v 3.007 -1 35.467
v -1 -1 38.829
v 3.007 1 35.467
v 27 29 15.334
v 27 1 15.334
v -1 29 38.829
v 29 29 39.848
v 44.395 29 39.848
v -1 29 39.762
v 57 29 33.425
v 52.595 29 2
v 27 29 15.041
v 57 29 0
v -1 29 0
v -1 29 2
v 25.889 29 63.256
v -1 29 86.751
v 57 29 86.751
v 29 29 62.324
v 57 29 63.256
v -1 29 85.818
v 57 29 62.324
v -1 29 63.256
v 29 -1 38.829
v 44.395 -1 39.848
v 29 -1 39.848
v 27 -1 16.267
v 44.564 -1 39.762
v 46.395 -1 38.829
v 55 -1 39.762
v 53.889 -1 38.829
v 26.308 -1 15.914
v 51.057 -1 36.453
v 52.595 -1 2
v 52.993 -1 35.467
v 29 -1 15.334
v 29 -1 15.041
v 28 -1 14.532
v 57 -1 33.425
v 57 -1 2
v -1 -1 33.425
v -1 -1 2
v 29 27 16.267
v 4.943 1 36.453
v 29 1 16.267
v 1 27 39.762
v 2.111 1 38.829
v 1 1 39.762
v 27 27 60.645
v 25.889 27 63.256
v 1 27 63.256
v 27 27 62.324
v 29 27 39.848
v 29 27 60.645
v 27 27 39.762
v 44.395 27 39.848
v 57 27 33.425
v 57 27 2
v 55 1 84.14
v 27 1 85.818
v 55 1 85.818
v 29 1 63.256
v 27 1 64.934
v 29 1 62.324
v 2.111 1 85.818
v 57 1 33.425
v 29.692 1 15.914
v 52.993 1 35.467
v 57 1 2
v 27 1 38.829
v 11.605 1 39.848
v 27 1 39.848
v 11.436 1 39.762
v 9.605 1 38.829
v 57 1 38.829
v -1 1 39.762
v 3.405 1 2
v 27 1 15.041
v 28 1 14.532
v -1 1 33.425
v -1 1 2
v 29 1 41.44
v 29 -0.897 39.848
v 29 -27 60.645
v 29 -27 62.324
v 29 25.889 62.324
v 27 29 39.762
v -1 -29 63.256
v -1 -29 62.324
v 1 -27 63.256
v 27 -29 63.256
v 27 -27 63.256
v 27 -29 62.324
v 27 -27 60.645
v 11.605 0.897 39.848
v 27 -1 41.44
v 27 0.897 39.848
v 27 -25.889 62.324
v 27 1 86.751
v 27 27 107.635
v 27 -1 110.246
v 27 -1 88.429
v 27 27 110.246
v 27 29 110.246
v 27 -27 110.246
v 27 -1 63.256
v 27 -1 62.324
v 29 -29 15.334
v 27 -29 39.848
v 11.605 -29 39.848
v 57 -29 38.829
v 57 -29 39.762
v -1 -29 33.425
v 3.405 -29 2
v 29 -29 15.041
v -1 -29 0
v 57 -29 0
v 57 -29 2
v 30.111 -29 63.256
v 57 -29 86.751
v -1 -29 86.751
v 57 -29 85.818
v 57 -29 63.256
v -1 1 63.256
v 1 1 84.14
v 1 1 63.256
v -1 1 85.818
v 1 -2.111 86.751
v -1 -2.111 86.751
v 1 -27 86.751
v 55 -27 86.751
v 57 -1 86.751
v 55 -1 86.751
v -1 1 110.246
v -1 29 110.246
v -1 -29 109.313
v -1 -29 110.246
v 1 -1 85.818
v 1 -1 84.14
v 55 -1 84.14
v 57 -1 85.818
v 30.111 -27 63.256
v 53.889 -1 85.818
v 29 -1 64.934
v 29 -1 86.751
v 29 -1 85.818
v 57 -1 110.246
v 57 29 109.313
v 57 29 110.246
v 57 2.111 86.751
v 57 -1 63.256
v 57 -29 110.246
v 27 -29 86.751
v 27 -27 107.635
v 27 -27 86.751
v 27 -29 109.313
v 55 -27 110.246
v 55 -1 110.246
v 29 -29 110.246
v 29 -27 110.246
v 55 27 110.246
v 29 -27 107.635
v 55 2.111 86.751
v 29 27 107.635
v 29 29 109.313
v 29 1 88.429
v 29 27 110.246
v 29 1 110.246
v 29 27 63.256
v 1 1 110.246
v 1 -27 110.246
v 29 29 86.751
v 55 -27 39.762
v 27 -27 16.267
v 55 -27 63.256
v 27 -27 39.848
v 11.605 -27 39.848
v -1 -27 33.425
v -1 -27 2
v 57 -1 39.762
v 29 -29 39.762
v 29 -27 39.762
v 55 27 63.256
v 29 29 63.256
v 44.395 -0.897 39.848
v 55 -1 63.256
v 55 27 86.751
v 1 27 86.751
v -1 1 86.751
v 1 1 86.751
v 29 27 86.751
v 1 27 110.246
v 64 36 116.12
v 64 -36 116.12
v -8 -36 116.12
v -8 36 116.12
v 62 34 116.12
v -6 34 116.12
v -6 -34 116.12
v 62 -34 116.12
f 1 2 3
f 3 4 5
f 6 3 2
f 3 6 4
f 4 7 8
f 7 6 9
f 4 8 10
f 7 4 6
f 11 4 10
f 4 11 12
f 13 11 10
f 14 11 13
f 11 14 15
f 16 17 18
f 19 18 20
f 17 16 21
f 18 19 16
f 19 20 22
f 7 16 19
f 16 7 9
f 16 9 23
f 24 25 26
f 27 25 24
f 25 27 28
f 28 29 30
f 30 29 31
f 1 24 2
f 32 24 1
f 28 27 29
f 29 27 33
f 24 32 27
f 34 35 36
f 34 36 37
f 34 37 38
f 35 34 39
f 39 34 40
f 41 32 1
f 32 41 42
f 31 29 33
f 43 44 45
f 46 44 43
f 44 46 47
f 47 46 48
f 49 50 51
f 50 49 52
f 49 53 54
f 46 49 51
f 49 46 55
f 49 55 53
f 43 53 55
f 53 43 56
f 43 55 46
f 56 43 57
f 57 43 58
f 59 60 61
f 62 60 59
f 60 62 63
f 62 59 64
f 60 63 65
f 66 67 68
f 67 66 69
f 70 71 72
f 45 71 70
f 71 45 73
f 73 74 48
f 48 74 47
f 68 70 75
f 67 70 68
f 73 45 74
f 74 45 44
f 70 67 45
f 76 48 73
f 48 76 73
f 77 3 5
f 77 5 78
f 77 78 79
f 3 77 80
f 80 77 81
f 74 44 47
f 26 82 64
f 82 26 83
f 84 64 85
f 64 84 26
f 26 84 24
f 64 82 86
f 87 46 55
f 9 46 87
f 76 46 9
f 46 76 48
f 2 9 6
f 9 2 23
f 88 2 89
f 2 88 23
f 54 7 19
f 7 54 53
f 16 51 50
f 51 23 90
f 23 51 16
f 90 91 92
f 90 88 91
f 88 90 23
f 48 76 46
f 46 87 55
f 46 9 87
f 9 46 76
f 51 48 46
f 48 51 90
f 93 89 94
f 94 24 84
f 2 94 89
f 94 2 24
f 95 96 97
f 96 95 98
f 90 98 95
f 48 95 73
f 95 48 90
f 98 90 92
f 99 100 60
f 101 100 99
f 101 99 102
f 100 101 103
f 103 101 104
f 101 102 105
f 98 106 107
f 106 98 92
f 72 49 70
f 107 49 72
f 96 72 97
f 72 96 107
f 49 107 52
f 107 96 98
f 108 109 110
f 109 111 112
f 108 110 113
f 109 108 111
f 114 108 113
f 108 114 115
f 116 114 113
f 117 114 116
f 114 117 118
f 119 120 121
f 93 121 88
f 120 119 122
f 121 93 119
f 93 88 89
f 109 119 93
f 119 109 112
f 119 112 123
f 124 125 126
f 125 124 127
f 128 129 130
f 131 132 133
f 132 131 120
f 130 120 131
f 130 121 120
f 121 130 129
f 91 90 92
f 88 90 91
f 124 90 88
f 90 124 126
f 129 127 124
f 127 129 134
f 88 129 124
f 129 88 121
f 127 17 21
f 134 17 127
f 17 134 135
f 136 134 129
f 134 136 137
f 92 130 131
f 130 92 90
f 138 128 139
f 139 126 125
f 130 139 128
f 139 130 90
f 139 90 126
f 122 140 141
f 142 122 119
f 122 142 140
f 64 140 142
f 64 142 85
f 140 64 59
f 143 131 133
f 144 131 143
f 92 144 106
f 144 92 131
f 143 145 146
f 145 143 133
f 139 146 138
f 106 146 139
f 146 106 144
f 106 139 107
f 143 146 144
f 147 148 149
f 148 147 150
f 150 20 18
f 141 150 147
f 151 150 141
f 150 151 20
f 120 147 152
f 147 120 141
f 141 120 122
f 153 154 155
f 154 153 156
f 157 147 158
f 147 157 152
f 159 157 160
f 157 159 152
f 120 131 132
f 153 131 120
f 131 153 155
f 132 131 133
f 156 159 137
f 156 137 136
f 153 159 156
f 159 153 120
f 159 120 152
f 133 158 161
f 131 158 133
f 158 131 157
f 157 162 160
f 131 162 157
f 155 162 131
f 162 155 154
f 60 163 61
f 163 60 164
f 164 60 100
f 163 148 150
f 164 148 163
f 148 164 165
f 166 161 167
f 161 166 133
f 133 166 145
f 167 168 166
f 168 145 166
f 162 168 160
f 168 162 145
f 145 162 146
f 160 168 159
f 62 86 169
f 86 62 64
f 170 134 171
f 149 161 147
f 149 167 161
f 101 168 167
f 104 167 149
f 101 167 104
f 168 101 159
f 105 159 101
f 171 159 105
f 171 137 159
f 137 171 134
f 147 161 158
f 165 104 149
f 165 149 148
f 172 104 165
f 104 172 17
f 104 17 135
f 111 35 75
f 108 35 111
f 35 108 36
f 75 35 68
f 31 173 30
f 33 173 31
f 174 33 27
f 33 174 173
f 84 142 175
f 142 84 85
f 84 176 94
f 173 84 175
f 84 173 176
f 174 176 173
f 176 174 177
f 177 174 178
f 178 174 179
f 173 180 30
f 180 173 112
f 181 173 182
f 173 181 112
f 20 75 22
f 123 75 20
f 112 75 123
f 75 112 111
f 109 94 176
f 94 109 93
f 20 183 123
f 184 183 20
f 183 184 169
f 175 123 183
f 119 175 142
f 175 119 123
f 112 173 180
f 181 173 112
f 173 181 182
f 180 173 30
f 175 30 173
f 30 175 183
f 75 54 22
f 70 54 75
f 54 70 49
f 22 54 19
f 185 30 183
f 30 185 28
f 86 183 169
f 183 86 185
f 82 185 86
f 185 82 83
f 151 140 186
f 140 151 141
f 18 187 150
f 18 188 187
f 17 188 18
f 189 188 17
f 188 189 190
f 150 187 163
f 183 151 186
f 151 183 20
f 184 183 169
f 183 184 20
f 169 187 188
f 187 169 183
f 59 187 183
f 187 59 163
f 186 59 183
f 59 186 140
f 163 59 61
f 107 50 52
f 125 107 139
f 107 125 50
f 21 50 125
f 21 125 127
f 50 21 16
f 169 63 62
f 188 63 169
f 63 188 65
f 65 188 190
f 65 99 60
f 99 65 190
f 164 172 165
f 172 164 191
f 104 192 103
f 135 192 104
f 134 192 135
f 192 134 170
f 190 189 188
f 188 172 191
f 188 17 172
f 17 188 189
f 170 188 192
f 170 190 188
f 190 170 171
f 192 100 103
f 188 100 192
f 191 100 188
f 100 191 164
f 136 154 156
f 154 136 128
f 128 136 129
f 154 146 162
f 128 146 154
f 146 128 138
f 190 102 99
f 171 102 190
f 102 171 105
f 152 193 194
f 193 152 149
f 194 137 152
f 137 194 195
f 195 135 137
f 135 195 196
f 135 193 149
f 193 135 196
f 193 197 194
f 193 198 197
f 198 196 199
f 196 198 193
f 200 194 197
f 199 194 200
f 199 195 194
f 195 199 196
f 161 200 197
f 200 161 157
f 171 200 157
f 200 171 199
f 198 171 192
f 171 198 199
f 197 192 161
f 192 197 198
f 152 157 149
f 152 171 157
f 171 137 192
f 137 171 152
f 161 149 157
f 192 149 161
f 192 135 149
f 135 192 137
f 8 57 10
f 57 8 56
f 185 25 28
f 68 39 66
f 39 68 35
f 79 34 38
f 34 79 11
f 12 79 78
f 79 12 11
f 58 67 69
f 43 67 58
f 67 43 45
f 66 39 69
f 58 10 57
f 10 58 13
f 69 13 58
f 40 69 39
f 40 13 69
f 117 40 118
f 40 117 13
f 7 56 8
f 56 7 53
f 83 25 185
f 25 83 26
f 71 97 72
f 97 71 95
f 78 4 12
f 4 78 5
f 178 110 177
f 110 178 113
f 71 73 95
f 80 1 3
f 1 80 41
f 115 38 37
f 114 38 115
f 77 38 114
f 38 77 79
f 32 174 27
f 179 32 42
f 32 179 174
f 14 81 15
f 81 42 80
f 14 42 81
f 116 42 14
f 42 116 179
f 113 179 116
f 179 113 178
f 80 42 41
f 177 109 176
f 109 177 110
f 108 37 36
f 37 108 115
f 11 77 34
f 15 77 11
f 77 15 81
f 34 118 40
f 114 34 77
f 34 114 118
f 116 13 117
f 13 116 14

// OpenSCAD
// [FL_INDEX: keywords="openscad, 3d_parametric, Angular_Dice_Tower, csg_solid" | COT="Parametric OpenSCAD design from 3DCodeverse"]
// Title: Angular Dice Tower

root_2 = sqrt(2);

// the slope of the ramps
slope = 40;	//[15:75]

// the slope of the final ramp
exit_slope = 27;    // [15:75]

// the width of the ramp walls
wall = 2; // [1:5]

// the distance between the outer edge of walls of the ramp
ramp_width = 30; //[10:70]

// the overhang amount on the top funnel
overhang=7;	// [0:10]


// the total width of the entire structure
// wall/2 + ramp_width + ramp_width + wall/2
total_width = wall + ramp_width*2;


// height of each level
level_height = (ramp_width-wall)*tan(slope);

// trim the lower edge of each ramp to fit into the one below
trim=(wall/sin(slope) - wall)*tan(slope);


//echo("level height : ", level_height);
//echo("4 levels high: ", level_height*4);


module ramp(corner=true, angle=slope, cut_top=true){
	translate([-wall/2,-wall/2,0]) 
		union(){
			intersection() {
				translate([0,0,ramp_width*tan(angle) - wall/cos(angle)])
					rotate([0,angle,0])
					 translate([-ramp_width*2,0,0])
						difference(){
							cube([ramp_width*5,ramp_width,ramp_width]);
							translate([-ramp_width,wall,wall]) cube([ramp_width*6,ramp_width-wall*2, ramp_width]);
						}
				if(cut_top==true){
					translate([0,0,-trim]) cube([ramp_width,ramp_width,(ramp_width-wall)*tan(angle)+trim]);
				} else {
					translate([0,0,-trim]) cube([ramp_width,ramp_width,ramp_width*tan(exit_slope)+level_height]);
					// add 
				}
			}
			if (corner== true){
				translate([0,0,level_height])
				 difference(){
					cube([ramp_width,ramp_width,level_height]);
					translate([wall,-wall,-ramp_width])	cube([ramp_width,ramp_width,ramp_width*2]);
				}
			}
		}
}

module exit_ramp(){
	ramp(false,exit_slope, false);
//	translate([-wall/2,-wall/2,0]) cube([ramp_width,wall,level_height]);
//	translate([-wall/2,ramp_width-wall*3/2,0]) cube([ramp_width,wall,level_height]);
}

module funnel() {
	difference() {
		translate([0,0,overhang*tan(slope)])
		difference(){
			pyramid();
			translate([0,0,wall*tan(slope)]) pyramid();
		}
		translate([0,0,-ramp_width]) cube(center=true, [ramp_width*2 - wall,ramp_width*2 -wall,ramp_width*2]);
	}	
}

module pyramid(){
	assign(total_overhang = ramp_width-wall/2+overhang){
	polyhedron(
		points = [ 	[total_overhang,total_overhang,0],	
					[total_overhang,-total_overhang,0],
					[-total_overhang,-total_overhang,0],
					[-total_overhang,total_overhang,0],
					[0,0,-total_overhang*tan(slope)]],
		triangles = [	[0,1,4],
						[1,2,4],
						[2,3,4],
						[3,0,4],
						[0,3,2],
						[0,2,1]],
		convexity=10);
	}
}


module tower(){
	union(){
		ramp();
		translate([ramp_width-wall,wall-ramp_width,(ramp_width-wall)*tan(slope)]) 
			rotate(90)
				ramp();
		translate([(ramp_width-wall)*2,0,(ramp_width-wall)*tan(slope)*2]) 
			rotate(180)
				ramp();
	
		translate([(ramp_width-wall),ramp_width-wall,(ramp_width-wall)*tan(slope)*3]) 	
			rotate(270)
				ramp(false);
	}
}


translate([0,0,wall + (ramp_width-wall)*tan(exit_slope)])
union(){
	tower();
	translate([(ramp_width-wall)*2,0,0]) rotate([0,0,180]) tower();
	translate([ramp_width-wall,0,level_height*4]) funnel();
}
// exit ramps
translate([ramp_width-wall,0,wall]) exit_ramp();
translate([ramp_width-wall,0,wall]) rotate([0,0,180]) exit_ramp();

// base:
translate([-wall/2,-ramp_width+wall/2,0]) cube([ramp_width*2 - wall,ramp_width*2 -wall,wall]);

// bounding box:
